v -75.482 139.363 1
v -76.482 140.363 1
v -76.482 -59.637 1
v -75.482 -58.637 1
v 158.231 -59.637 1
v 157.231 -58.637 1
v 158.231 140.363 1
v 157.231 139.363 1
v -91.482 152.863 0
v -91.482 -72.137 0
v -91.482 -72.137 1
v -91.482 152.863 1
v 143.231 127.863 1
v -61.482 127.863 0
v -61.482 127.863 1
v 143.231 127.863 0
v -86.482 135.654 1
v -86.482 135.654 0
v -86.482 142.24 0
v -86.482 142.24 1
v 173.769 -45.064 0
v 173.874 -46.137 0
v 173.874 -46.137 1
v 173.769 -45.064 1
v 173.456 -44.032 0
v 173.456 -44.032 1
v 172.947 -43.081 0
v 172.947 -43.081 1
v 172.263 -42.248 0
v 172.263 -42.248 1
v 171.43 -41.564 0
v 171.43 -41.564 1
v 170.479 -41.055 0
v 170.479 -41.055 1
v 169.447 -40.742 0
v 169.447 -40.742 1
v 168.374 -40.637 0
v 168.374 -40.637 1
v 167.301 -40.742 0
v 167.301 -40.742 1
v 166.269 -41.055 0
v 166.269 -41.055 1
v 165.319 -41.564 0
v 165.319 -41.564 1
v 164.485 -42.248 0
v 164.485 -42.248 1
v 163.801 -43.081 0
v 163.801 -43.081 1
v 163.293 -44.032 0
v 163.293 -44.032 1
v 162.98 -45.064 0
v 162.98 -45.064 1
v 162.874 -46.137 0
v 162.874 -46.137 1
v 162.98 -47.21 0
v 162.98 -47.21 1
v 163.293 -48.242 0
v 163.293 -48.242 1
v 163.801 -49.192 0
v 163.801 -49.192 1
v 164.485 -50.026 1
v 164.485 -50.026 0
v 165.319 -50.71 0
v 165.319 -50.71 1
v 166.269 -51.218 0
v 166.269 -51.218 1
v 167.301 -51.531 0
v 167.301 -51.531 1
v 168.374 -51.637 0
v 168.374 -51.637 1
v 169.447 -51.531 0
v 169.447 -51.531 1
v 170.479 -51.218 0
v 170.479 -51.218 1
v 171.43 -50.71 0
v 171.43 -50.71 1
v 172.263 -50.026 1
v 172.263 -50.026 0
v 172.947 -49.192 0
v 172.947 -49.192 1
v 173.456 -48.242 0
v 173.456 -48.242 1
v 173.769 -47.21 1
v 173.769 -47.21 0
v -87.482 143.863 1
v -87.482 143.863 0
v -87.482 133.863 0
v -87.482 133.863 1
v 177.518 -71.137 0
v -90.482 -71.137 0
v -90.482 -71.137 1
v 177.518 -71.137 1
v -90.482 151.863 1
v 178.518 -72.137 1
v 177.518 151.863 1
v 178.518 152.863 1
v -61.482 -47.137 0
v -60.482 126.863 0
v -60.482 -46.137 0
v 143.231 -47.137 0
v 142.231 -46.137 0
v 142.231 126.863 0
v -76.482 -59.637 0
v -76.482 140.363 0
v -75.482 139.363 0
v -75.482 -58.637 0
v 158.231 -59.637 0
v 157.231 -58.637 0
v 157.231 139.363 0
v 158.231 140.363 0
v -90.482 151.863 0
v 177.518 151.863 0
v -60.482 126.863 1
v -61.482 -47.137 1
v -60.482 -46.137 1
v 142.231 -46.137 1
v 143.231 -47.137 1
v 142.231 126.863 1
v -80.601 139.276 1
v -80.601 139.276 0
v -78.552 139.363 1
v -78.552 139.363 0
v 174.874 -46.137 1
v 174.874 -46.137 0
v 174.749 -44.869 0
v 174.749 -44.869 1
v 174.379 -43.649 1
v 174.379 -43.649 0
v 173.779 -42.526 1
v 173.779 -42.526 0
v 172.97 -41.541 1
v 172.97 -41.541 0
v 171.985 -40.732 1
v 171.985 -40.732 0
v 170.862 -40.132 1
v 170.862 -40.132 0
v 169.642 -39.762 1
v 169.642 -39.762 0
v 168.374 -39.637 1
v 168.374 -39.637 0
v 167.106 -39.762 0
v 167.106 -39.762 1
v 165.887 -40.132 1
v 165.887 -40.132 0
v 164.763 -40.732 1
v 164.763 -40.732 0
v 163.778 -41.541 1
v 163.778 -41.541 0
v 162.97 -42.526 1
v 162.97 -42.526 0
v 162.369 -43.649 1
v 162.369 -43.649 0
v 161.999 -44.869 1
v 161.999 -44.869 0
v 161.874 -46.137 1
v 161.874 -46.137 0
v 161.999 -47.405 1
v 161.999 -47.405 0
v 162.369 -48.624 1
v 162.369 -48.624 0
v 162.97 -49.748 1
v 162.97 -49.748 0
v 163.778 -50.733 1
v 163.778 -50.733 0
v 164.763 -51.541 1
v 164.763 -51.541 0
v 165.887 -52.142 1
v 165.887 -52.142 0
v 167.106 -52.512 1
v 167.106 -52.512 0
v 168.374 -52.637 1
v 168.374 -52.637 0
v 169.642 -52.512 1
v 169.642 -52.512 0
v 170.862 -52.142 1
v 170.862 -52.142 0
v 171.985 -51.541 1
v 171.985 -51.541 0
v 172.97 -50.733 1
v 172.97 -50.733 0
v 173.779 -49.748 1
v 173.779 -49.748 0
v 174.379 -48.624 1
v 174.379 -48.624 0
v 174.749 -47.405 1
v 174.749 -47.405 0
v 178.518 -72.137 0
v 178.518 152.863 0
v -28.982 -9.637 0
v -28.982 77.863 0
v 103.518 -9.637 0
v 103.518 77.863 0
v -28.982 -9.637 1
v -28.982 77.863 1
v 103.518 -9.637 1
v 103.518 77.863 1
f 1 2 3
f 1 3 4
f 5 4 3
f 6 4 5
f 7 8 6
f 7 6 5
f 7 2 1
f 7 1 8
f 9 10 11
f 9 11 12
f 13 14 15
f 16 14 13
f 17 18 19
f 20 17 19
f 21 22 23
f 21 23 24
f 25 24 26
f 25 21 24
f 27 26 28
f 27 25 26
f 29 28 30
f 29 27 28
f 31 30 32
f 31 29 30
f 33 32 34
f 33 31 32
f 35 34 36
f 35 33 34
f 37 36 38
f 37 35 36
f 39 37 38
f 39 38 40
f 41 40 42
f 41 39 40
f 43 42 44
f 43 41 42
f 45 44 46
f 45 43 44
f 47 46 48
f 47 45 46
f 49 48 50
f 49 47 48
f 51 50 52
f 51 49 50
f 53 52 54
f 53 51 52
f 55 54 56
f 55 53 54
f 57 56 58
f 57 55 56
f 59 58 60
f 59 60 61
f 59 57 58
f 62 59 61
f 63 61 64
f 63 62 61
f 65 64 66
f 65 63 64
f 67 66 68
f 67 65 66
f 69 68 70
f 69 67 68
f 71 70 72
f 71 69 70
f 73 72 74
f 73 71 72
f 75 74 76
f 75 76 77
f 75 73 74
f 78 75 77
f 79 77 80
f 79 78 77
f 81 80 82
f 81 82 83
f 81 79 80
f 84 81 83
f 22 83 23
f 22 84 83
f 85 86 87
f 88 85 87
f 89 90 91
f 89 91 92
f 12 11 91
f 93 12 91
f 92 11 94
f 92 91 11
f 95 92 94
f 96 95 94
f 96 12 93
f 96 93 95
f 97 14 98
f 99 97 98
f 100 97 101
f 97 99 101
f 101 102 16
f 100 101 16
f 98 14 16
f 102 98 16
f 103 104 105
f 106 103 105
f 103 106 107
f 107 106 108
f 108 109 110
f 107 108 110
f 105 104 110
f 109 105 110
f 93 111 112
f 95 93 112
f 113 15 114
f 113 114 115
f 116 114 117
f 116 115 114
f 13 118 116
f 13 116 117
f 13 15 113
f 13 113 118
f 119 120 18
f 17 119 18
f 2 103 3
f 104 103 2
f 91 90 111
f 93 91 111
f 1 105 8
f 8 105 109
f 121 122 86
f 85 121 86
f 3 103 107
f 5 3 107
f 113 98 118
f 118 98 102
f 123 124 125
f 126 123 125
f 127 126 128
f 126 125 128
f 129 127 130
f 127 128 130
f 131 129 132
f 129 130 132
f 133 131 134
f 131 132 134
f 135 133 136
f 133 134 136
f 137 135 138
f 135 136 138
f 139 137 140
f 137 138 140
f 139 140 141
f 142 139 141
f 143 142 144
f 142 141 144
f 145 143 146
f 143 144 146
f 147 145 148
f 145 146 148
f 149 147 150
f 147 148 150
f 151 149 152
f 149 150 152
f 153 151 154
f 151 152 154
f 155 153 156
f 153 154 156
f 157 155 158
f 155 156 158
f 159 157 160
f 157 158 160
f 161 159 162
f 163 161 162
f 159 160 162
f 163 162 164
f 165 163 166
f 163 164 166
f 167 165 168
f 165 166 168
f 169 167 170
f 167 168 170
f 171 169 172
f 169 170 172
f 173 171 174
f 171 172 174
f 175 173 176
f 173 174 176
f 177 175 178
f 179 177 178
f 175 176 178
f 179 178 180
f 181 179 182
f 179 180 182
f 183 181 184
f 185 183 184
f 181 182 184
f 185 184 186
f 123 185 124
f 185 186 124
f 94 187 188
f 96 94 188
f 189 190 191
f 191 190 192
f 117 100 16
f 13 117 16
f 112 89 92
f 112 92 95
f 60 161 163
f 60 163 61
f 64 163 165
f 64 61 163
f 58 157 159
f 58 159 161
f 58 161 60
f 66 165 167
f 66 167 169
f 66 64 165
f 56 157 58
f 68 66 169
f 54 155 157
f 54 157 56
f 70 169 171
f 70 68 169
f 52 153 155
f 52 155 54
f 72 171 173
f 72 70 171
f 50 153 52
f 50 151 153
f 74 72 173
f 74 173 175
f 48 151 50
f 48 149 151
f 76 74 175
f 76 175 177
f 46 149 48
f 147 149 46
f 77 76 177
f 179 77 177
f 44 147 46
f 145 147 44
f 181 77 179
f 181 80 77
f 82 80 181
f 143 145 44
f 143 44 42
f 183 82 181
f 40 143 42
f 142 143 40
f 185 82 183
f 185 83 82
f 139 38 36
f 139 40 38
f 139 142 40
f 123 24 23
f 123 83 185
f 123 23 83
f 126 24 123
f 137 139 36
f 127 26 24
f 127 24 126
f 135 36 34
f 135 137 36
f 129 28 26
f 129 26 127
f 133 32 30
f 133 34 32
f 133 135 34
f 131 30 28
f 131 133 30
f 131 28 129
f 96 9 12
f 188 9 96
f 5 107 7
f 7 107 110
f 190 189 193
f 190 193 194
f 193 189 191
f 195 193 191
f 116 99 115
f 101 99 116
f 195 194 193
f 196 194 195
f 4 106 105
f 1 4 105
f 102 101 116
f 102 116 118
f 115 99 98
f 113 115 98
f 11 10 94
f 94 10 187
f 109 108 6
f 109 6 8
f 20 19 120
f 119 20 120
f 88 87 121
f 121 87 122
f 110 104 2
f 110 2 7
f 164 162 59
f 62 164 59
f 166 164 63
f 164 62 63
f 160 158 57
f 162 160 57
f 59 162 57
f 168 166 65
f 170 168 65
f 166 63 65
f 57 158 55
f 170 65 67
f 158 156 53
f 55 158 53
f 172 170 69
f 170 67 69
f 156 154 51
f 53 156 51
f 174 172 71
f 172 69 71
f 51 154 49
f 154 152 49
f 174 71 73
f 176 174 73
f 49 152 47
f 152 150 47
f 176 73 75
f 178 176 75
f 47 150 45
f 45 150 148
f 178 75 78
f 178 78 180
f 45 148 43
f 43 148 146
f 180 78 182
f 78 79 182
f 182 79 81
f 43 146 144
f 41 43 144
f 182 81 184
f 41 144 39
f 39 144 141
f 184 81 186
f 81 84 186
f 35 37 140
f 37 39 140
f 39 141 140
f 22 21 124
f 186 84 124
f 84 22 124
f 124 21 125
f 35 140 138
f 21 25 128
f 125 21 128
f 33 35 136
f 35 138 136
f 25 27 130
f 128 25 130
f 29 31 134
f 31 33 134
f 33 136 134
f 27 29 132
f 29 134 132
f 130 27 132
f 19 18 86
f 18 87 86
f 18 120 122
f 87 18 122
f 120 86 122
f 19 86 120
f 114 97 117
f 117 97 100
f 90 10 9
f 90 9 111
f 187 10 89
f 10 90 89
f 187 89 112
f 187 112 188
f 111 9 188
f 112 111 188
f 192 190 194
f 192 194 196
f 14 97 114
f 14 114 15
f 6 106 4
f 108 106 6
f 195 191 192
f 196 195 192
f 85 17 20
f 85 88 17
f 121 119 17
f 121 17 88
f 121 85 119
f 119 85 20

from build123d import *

# Parameters (mm, degrees)
F1_W     = 270
F1_H     = 225
F1_W_2   = 268
F1_H_2   = 223
F2_DEPTH = 1
F1_W_3   = 234.7133469
F1_H_3   = 200
F1_W_4   = 232.7133469
F1_H_4   = 198
F1_W_5   = 204.7133469
F1_H_5   = 175
F1_W_6   = 202.7133469
F1_H_6   = 173
F1_R     = 6.5
F1_R_2   = 5.5
F1_W_7   = 132.5
F1_H_7   = 87.5


with BuildPart() as f2:
    # F1 (on Top) → F2 (new body)
    with BuildSketch(Plane.XY):
        with Locations((43.5175617039, 40.3632308638)):
            Rectangle(F1_W, F1_H)
        with Locations((43.5175617039, 40.3632308638)):
            Rectangle(F1_W_2, F1_H_2, mode=Mode.SUBTRACT)
    extrude(amount=F2_DEPTH)


with BuildPart() as f2b:
    # F1 (on Top) → F2, piece 2 (new body)
    with BuildSketch(Plane.XY):
        with Locations((40.8742351539, 40.3632308638)):
            Rectangle(F1_W_3, F1_H_3)
        with Locations((40.8742351539, 40.3632308638)):
            Rectangle(F1_W_4, F1_H_4, mode=Mode.SUBTRACT)
    extrude(amount=F2_DEPTH)


with BuildPart() as f2c:
    # F1 (on Top) → F2, piece 3 (new body)
    with BuildSketch(Plane.XY):
        with Locations((40.8742351539, 40.3632308638)):
            Rectangle(F1_W_5, F1_H_5)
        with Locations((40.8742351539, 40.3632308638)):
            Rectangle(F1_W_6, F1_H_6, mode=Mode.SUBTRACT)
    extrude(amount=F2_DEPTH)


with BuildPart() as f2d:
    # F1 (on Top) → F2, piece 4 (new body)
    with BuildSketch(Plane.XY):
        with Locations((168.3742351539, -46.1367691362)):
            Circle(F1_R)
        with Locations((168.3742351539, -46.1367691362)):
            Circle(F1_R_2, mode=Mode.SUBTRACT)
    extrude(amount=F2_DEPTH)


with BuildPart() as f2e:
    # F1 (on Top) → F2, piece 5 (new body)
    with BuildSketch(Plane.XY):
        with Locations((37.2675617039, 34.1132308638)):
            Rectangle(F1_W_7, F1_H_7)
    extrude(amount=F2_DEPTH)


with BuildPart() as f2f:
    # F1 (on Top) → F2, piece 6 (new body)
    with BuildSketch(Plane.XY):
        Polygon((-78.5521527463, 139.3632308638), (-87.4824382961, 143.8632308638), (-87.4824382961, 133.8632308638), align=None)
        Polygon((-86.4824382961, 135.6535530649), (-86.4824382961, 142.2395425821), (-80.6009615945, 139.2758472994), align=None, mode=Mode.SUBTRACT)
    extrude(amount=F2_DEPTH)


solid = Compound([f2.part, f2b.part, f2c.part, f2d.part, f2e.part, f2f.part])
